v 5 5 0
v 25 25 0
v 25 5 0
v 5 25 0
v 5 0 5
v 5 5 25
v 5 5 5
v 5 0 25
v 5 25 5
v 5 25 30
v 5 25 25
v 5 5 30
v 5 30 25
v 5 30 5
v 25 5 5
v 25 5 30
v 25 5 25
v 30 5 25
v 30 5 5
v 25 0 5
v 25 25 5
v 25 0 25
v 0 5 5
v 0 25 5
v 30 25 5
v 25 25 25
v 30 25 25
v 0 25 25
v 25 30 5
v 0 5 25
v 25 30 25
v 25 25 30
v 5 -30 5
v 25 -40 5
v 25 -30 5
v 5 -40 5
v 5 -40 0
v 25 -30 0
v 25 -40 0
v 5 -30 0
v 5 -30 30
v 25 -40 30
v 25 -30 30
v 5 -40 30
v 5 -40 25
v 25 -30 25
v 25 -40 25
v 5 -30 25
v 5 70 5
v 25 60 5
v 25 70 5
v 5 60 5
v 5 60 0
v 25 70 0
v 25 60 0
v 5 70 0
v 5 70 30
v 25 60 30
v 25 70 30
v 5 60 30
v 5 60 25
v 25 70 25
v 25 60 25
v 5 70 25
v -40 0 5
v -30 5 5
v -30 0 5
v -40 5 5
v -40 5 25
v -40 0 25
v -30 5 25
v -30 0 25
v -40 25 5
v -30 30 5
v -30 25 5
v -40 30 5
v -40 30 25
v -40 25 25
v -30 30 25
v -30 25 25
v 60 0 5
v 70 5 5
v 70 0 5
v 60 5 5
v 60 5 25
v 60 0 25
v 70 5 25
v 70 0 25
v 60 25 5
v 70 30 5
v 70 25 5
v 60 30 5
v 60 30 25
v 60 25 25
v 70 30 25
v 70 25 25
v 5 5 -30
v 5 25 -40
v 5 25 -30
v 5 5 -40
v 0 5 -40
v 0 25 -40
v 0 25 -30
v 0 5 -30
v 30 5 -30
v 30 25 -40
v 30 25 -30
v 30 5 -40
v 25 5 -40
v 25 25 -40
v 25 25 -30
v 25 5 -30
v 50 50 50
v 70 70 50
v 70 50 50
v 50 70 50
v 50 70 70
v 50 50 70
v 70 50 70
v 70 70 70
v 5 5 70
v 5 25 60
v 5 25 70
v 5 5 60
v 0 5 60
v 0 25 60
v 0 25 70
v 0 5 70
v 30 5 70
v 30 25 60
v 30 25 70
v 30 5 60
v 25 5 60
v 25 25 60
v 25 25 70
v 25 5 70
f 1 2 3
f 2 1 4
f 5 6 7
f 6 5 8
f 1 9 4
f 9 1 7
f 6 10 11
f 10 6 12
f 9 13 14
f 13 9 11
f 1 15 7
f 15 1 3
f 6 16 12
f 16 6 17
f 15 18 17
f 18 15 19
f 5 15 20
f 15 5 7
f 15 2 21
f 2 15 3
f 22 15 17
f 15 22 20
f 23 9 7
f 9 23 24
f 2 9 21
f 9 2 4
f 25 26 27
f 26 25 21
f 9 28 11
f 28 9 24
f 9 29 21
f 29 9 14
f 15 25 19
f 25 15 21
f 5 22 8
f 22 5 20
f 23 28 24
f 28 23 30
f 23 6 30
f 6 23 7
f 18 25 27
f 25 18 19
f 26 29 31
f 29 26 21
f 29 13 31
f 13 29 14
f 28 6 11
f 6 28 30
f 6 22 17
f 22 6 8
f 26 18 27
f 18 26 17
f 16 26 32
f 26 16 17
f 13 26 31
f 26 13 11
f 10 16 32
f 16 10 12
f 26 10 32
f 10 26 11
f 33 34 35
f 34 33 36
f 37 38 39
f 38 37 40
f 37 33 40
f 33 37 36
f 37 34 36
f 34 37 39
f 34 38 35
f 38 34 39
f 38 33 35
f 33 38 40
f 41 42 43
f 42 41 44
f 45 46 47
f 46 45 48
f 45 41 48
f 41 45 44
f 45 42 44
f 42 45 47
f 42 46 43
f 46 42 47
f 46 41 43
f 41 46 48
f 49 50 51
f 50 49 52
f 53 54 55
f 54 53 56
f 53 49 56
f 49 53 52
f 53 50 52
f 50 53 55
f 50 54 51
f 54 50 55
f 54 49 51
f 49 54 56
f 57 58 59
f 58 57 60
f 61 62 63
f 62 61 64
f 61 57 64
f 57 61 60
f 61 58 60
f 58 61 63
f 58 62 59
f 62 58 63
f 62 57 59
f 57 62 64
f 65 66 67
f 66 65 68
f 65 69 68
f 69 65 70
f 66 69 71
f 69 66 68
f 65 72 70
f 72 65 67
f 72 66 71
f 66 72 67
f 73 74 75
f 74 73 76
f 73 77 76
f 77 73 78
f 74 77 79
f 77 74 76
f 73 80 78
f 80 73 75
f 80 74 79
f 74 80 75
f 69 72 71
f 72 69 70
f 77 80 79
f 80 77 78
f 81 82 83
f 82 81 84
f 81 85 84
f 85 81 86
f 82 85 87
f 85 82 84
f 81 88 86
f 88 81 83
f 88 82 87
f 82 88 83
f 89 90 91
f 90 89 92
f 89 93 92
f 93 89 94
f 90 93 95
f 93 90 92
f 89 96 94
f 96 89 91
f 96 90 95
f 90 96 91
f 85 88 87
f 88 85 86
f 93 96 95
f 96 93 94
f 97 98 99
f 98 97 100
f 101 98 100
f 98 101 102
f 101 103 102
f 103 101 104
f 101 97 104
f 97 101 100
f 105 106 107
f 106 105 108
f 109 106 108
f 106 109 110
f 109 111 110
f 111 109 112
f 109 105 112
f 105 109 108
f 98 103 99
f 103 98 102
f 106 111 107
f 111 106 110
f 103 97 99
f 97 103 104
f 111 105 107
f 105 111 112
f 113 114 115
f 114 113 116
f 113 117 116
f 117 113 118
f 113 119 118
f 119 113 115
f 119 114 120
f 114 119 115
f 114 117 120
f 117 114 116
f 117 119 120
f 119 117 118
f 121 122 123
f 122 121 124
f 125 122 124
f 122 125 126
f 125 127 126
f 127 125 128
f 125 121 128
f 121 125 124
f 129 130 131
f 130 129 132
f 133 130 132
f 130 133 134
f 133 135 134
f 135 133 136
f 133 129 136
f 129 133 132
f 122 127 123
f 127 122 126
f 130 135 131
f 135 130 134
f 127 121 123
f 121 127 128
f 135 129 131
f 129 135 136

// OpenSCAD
// SCAD file for Six Piece Burr Puzzle
// 整体模型
union() {
  translate([5, 5, 0]) color([0, 0.8, 0, 0.85]) cube([5, 5, 5]);
  translate([10, 5, 0]) color([0, 0.8, 0, 0.85]) cube([5, 5, 5]);
  translate([15, 5, 0]) color([0, 0.8, 0, 0.85]) cube([5, 5, 5]);
  translate([20, 5, 0]) color([0, 0.8, 0, 0.85]) cube([5, 5, 5]);
  translate([5, 10, 0]) color([0, 0.8, 0, 0.85]) cube([5, 5, 5]);
  translate([10, 10, 0]) color([0, 0.8, 0, 0.85]) cube([5, 5, 5]);
  translate([15, 10, 0]) color([0, 0.8, 0, 0.85]) cube([5, 5, 5]);
  translate([20, 10, 0]) color([0, 0.8, 0, 0.85]) cube([5, 5, 5]);
  translate([5, 15, 0]) color([1, 0, 0, 0.85]) cube([5, 5, 5]);
  translate([10, 15, 0]) color([1, 0, 0, 0.85]) cube([5, 5, 5]);
  translate([15, 15, 0]) color([1, 0, 0, 0.85]) cube([5, 5, 5]);
  translate([20, 15, 0]) color([1, 0, 0, 0.85]) cube([5, 5, 5]);
  translate([5, 20, 0]) color([1, 0, 0, 0.85]) cube([5, 5, 5]);
  translate([10, 20, 0]) color([1, 0, 0, 0.85]) cube([5, 5, 5]);
  translate([15, 20, 0]) color([1, 0, 0, 0.85]) cube([5, 5, 5]);
  translate([20, 20, 0]) color([1, 0, 0, 0.85]) cube([5, 5, 5]);
  translate([5, 0, 5]) color([0.6, 0, 1, 0.85]) cube([5, 5, 5]);
  translate([10, 0, 5]) color([0.6, 0, 1, 0.85]) cube([5, 5, 5]);
  translate([15, 0, 5]) color([1, 0.4, 0, 0.85]) cube([5, 5, 5]);
  translate([20, 0, 5]) color([1, 0.4, 0, 0.85]) cube([5, 5, 5]);
  translate([0, 5, 5]) color([1, 0.8, 0, 0.85]) cube([5, 5, 5]);
  translate([5, 5, 5]) color([0.8, 0.8, 0.8, 0.85]) cube([5, 5, 5]);
  translate([10, 5, 5]) color([0.8, 0.8, 0.8, 0.85]) cube([5, 5, 5]);
  translate([15, 5, 5]) color([0.8, 0.8, 0.8, 0.85]) cube([5, 5, 5]);
  translate([20, 5, 5]) color([0.8, 0.8, 0.8, 0.85]) cube([5, 5, 5]);
  translate([25, 5, 5]) color([1, 0.8, 0, 0.85]) cube([5, 5, 5]);
  translate([0, 10, 5]) color([1, 0.8, 0, 0.85]) cube([5, 5, 5]);
  translate([5, 10, 5]) color([0.8, 0.8, 0.8, 0.85]) cube([5, 5, 5]);
  translate([10, 10, 5]) color([0.8, 0.8, 0.8, 0.85]) cube([5, 5, 5]);
  translate([15, 10, 5]) color([0.8, 0.8, 0.8, 0.85]) cube([5, 5, 5]);
  translate([20, 10, 5]) color([0.8, 0.8, 0.8, 0.85]) cube([5, 5, 5]);
  translate([25, 10, 5]) color([1, 0.8, 0, 0.85]) cube([5, 5, 5]);
  translate([0, 15, 5]) color([1, 0.8, 0, 0.85]) cube([5, 5, 5]);
  translate([5, 15, 5]) color([0.8, 0.8, 0.8, 0.85]) cube([5, 5, 5]);
  translate([10, 15, 5]) color([0.8, 0.8, 0.8, 0.85]) cube([5, 5, 5]);
  translate([15, 15, 5]) color([0.8, 0.8, 0.8, 0.85]) cube([5, 5, 5]);
  translate([20, 15, 5]) color([0.8, 0.8, 0.8, 0.85]) cube([5, 5, 5]);
  translate([25, 15, 5]) color([1, 0.8, 0, 0.85]) cube([5, 5, 5]);
  translate([0, 20, 5]) color([1, 0.8, 0, 0.85]) cube([5, 5, 5]);
  translate([5, 20, 5]) color([0.8, 0.8, 0.8, 0.85]) cube([5, 5, 5]);
  translate([10, 20, 5]) color([0.8, 0.8, 0.8, 0.85]) cube([5, 5, 5]);
  translate([15, 20, 5]) color([0.8, 0.8, 0.8, 0.85]) cube([5, 5, 5]);
  translate([20, 20, 5]) color([0.8, 0.8, 0.8, 0.85]) cube([5, 5, 5]);
  translate([25, 20, 5]) color([1, 0.8, 0, 0.85]) cube([5, 5, 5]);
  translate([5, 25, 5]) color([0.6, 0, 1, 0.85]) cube([5, 5, 5]);
  translate([10, 25, 5]) color([0.6, 0, 1, 0.85]) cube([5, 5, 5]);
  translate([15, 25, 5]) color([1, 0.4, 0, 0.85]) cube([5, 5, 5]);
  translate([20, 25, 5]) color([1, 0.4, 0, 0.85]) cube([5, 5, 5]);
  translate([5, 0, 10]) color([0.6, 0, 1, 0.85]) cube([5, 5, 5]);
  translate([10, 0, 10]) color([0.6, 0, 1, 0.85]) cube([5, 5, 5]);
  translate([15, 0, 10]) color([1, 0.4, 0, 0.85]) cube([5, 5, 5]);
  translate([20, 0, 10]) color([1, 0.4, 0, 0.85]) cube([5, 5, 5]);
  translate([0, 5, 10]) color([1, 0.8, 0, 0.85]) cube([5, 5, 5]);
  translate([5, 5, 10]) color([0.8, 0.8, 0.8, 0.85]) cube([5, 5, 5]);
  translate([10, 5, 10]) color([0.8, 0.8, 0.8, 0.85]) cube([5, 5, 5]);
  translate([15, 5, 10]) color([0.8, 0.8, 0.8, 0.85]) cube([5, 5, 5]);
  translate([20, 5, 10]) color([0.8, 0.8, 0.8, 0.85]) cube([5, 5, 5]);
  translate([25, 5, 10]) color([1, 0.8, 0, 0.85]) cube([5, 5, 5]);
  translate([0, 10, 10]) color([1, 0.8, 0, 0.85]) cube([5, 5, 5]);
  translate([5, 10, 10]) color([0.8, 0.8, 0.8, 0.85]) cube([5, 5, 5]);
  translate([10, 10, 10]) color([0.8, 0.8, 0.8, 0.85]) cube([5, 5, 5]);
  translate([15, 10, 10]) color([0.8, 0.8, 0.8, 0.85]) cube([5, 5, 5]);
  translate([20, 10, 10]) color([0.8, 0.8, 0.8, 0.85]) cube([5, 5, 5]);
  translate([25, 10, 10]) color([1, 0.8, 0, 0.85]) cube([5, 5, 5]);
  translate([0, 15, 10]) color([1, 0.8, 0, 0.85]) cube([5, 5, 5]);
  translate([5, 15, 10]) color([0.8, 0.8, 0.8, 0.85]) cube([5, 5, 5]);
  translate([10, 15, 10]) color([0.8, 0.8, 0.8, 0.85]) cube([5, 5, 5]);
  translate([15, 15, 10]) color([0.8, 0.8, 0.8, 0.85]) cube([5, 5, 5]);
  translate([20, 15, 10]) color([0.8, 0.8, 0.8, 0.85]) cube([5, 5, 5]);
  translate([25, 15, 10]) color([1, 0.8, 0, 0.85]) cube([5, 5, 5]);
  translate([0, 20, 10]) color([1, 0.8, 0, 0.85]) cube([5, 5, 5]);
  translate([5, 20, 10]) color([0.8, 0.8, 0.8, 0.85]) cube([5, 5, 5]);
  translate([10, 20, 10]) color([0.8, 0.8, 0.8, 0.85]) cube([5, 5, 5]);
  translate([15, 20, 10]) color([0.8, 0.8, 0.8, 0.85]) cube([5, 5, 5]);
  translate([20, 20, 10]) color([0.8, 0.8, 0.8, 0.85]) cube([5, 5, 5]);
  translate([25, 20, 10]) color([1, 0.8, 0, 0.85]) cube([5, 5, 5]);
  translate([5, 25, 10]) color([0.6, 0, 1, 0.85]) cube([5, 5, 5]);
  translate([10, 25, 10]) color([0.6, 0, 1, 0.85]) cube([5, 5, 5]);
  translate([15, 25, 10]) color([1, 0.4, 0, 0.85]) cube([5, 5, 5]);
  translate([20, 25, 10]) color([1, 0.4, 0, 0.85]) cube([5, 5, 5]);
  translate([5, 0, 15]) color([0.6, 0, 1, 0.85]) cube([5, 5, 5]);
  translate([10, 0, 15]) color([0.6, 0, 1, 0.85]) cube([5, 5, 5]);
  translate([15, 0, 15]) color([1, 0.4, 0, 0.85]) cube([5, 5, 5]);
  translate([20, 0, 15]) color([1, 0.4, 0, 0.85]) cube([5, 5, 5]);
  translate([0, 5, 15]) color([0, 0.4, 1, 0.85]) cube([5, 5, 5]);
  translate([5, 5, 15]) color([0.8, 0.8, 0.8, 0.85]) cube([5, 5, 5]);
  translate([10, 5, 15]) color([0.8, 0.8, 0.8, 0.85]) cube([5, 5, 5]);
  translate([15, 5, 15]) color([0.8, 0.8, 0.8, 0.85]) cube([5, 5, 5]);
  translate([20, 5, 15]) color([0.8, 0.8, 0.8, 0.85]) cube([5, 5, 5]);
  translate([25, 5, 15]) color([0, 0.4, 1, 0.85]) cube([5, 5, 5]);
  translate([0, 10, 15]) color([0, 0.4, 1, 0.85]) cube([5, 5, 5]);
  translate([5, 10, 15]) color([0.8, 0.8, 0.8, 0.85]) cube([5, 5, 5]);
  translate([10, 10, 15]) color([0.8, 0.8, 0.8, 0.85]) cube([5, 5, 5]);
  translate([15, 10, 15]) color([0.8, 0.8, 0.8, 0.85]) cube([5, 5, 5]);
  translate([20, 10, 15]) color([0.8, 0.8, 0.8, 0.85]) cube([5, 5, 5]);
  translate([25, 10, 15]) color([0, 0.4, 1, 0.85]) cube([5, 5, 5]);
  translate([0, 15, 15]) color([0, 0.4, 1, 0.85]) cube([5, 5, 5]);
  translate([5, 15, 15]) color([0.8, 0.8, 0.8, 0.85]) cube([5, 5, 5]);
  translate([10, 15, 15]) color([0.8, 0.8, 0.8, 0.85]) cube([5, 5, 5]);
  translate([15, 15, 15]) color([0.8, 0.8, 0.8, 0.85]) cube([5, 5, 5]);
  translate([20, 15, 15]) color([0.8, 0.8, 0.8, 0.85]) cube([5, 5, 5]);
  translate([25, 15, 15]) color([0, 0.4, 1, 0.85]) cube([5, 5, 5]);
  translate([0, 20, 15]) color([0, 0.4, 1, 0.85]) cube([5, 5, 5]);
  translate([5, 20, 15]) color([0.8, 0.8, 0.8, 0.85]) cube([5, 5, 5]);
  translate([10, 20, 15]) color([0.8, 0.8, 0.8, 0.85]) cube([5, 5, 5]);
  translate([15, 20, 15]) color([0.8, 0.8, 0.8, 0.85]) cube([5, 5, 5]);
  translate([20, 20, 15]) color([0.8, 0.8, 0.8, 0.85]) cube([5, 5, 5]);
  translate([25, 20, 15]) color([0, 0.4, 1, 0.85]) cube([5, 5, 5]);
  translate([5, 25, 15]) color([0.6, 0, 1, 0.85]) cube([5, 5, 5]);
  translate([10, 25, 15]) color([0.6, 0, 1, 0.85]) cube([5, 5, 5]);
  translate([15, 25, 15]) color([1, 0.4, 0, 0.85]) cube([5, 5, 5]);
  translate([20, 25, 15]) color([1, 0.4, 0, 0.85]) cube([5, 5, 5]);
  translate([5, 0, 20]) color([0.6, 0, 1, 0.85]) cube([5, 5, 5]);
  translate([10, 0, 20]) color([0.6, 0, 1, 0.85]) cube([5, 5, 5]);
  translate([15, 0, 20]) color([1, 0.4, 0, 0.85]) cube([5, 5, 5]);
  translate([20, 0, 20]) color([1, 0.4, 0, 0.85]) cube([5, 5, 5]);
  translate([0, 5, 20]) color([0, 0.4, 1, 0.85]) cube([5, 5, 5]);
  translate([5, 5, 20]) color([0.8, 0.8, 0.8, 0.85]) cube([5, 5, 5]);
  translate([10, 5, 20]) color([0.8, 0.8, 0.8, 0.85]) cube([5, 5, 5]);
  translate([15, 5, 20]) color([0.8, 0.8, 0.8, 0.85]) cube([5, 5, 5]);
  translate([20, 5, 20]) color([0.8, 0.8, 0.8, 0.85]) cube([5, 5, 5]);
  translate([25, 5, 20]) color([0, 0.4, 1, 0.85]) cube([5, 5, 5]);
  translate([0, 10, 20]) color([0, 0.4, 1, 0.85]) cube([5, 5, 5]);
  translate([5, 10, 20]) color([0.8, 0.8, 0.8, 0.85]) cube([5, 5, 5]);
  translate([10, 10, 20]) color([0.8, 0.8, 0.8, 0.85]) cube([5, 5, 5]);
  translate([15, 10, 20]) color([0.8, 0.8, 0.8, 0.85]) cube([5, 5, 5]);
  translate([20, 10, 20]) color([0.8, 0.8, 0.8, 0.85]) cube([5, 5, 5]);
  translate([25, 10, 20]) color([0, 0.4, 1, 0.85]) cube([5, 5, 5]);
  translate([0, 15, 20]) color([0, 0.4, 1, 0.85]) cube([5, 5, 5]);
  translate([5, 15, 20]) color([0.8, 0.8, 0.8, 0.85]) cube([5, 5, 5]);
  translate([10, 15, 20]) color([0.8, 0.8, 0.8, 0.85]) cube([5, 5, 5]);
  translate([15, 15, 20]) color([0.8, 0.8, 0.8, 0.85]) cube([5, 5, 5]);
  translate([20, 15, 20]) color([0.8, 0.8, 0.8, 0.85]) cube([5, 5, 5]);
  translate([25, 15, 20]) color([0, 0.4, 1, 0.85]) cube([5, 5, 5]);
  translate([0, 20, 20]) color([0, 0.4, 1, 0.85]) cube([5, 5, 5]);
  translate([5, 20, 20]) color([0.8, 0.8, 0.8, 0.85]) cube([5, 5, 5]);
  translate([10, 20, 20]) color([0.8, 0.8, 0.8, 0.85]) cube([5, 5, 5]);
  translate([15, 20, 20]) color([0.8, 0.8, 0.8, 0.85]) cube([5, 5, 5]);
  translate([20, 20, 20]) color([0.8, 0.8, 0.8, 0.85]) cube([5, 5, 5]);
  translate([25, 20, 20]) color([0, 0.4, 1, 0.85]) cube([5, 5, 5]);
  translate([5, 25, 20]) color([0.6, 0, 1, 0.85]) cube([5, 5, 5]);
  translate([10, 25, 20]) color([0.6, 0, 1, 0.85]) cube([5, 5, 5]);
  translate([15, 25, 20]) color([1, 0.4, 0, 0.85]) cube([5, 5, 5]);
  translate([20, 25, 20]) color([1, 0.4, 0, 0.85]) cube([5, 5, 5]);
  translate([5, 5, 25]) color([0, 0.8, 0, 0.85]) cube([5, 5, 5]);
  translate([10, 5, 25]) color([0, 0.8, 0, 0.85]) cube([5, 5, 5]);
  translate([15, 5, 25]) color([0, 0.8, 0, 0.85]) cube([5, 5, 5]);
  translate([20, 5, 25]) color([0, 0.8, 0, 0.85]) cube([5, 5, 5]);
  translate([5, 10, 25]) color([0, 0.8, 0, 0.85]) cube([5, 5, 5]);
  translate([10, 10, 25]) color([0, 0.8, 0, 0.85]) cube([5, 5, 5]);
  translate([15, 10, 25]) color([0, 0.8, 0, 0.85]) cube([5, 5, 5]);
  translate([20, 10, 25]) color([0, 0.8, 0, 0.85]) cube([5, 5, 5]);
  translate([5, 15, 25]) color([1, 0, 0, 0.85]) cube([5, 5, 5]);
  translate([10, 15, 25]) color([1, 0, 0, 0.85]) cube([5, 5, 5]);
  translate([15, 15, 25]) color([1, 0, 0, 0.85]) cube([5, 5, 5]);
  translate([20, 15, 25]) color([1, 0, 0, 0.85]) cube([5, 5, 5]);
  translate([5, 20, 25]) color([1, 0, 0, 0.85]) cube([5, 5, 5]);
  translate([10, 20, 25]) color([1, 0, 0, 0.85]) cube([5, 5, 5]);
  translate([15, 20, 25]) color([1, 0, 0, 0.85]) cube([5, 5, 5]);
  translate([20, 20, 25]) color([1, 0, 0, 0.85]) cube([5, 5, 5]);
}

// 零件 B
union() {
  translate([5.0, -40.0, 0.0]) color([0, 0.8, 0, 0.85]) cube([5, 5, 5]);
  translate([10.0, -40.0, 0.0]) color([0, 0.8, 0, 0.85]) cube([5, 5, 5]);
  translate([15.0, -40.0, 0.0]) color([0, 0.8, 0, 0.85]) cube([5, 5, 5]);
  translate([20.0, -40.0, 0.0]) color([0, 0.8, 0, 0.85]) cube([5, 5, 5]);
  translate([5.0, -35.0, 0.0]) color([0, 0.8, 0, 0.85]) cube([5, 5, 5]);
  translate([10.0, -35.0, 0.0]) color([0, 0.8, 0, 0.85]) cube([5, 5, 5]);
  translate([15.0, -35.0, 0.0]) color([0, 0.8, 0, 0.85]) cube([5, 5, 5]);
  translate([20.0, -35.0, 0.0]) color([0, 0.8, 0, 0.85]) cube([5, 5, 5]);
  translate([5.0, -40.0, 25.0]) color([0, 0.8, 0, 0.85]) cube([5, 5, 5]);
  translate([10.0, -40.0, 25.0]) color([0, 0.8, 0, 0.85]) cube([5, 5, 5]);
  translate([15.0, -40.0, 25.0]) color([0, 0.8, 0, 0.85]) cube([5, 5, 5]);
  translate([20.0, -40.0, 25.0]) color([0, 0.8, 0, 0.85]) cube([5, 5, 5]);
  translate([5.0, -35.0, 25.0]) color([0, 0.8, 0, 0.85]) cube([5, 5, 5]);
  translate([10.0, -35.0, 25.0]) color([0, 0.8, 0, 0.85]) cube([5, 5, 5]);
  translate([15.0, -35.0, 25.0]) color([0, 0.8, 0, 0.85]) cube([5, 5, 5]);
  translate([20.0, -35.0, 25.0]) color([0, 0.8, 0, 0.85]) cube([5, 5, 5]);
}

// 零件 A
union() {
  translate([5.0, 60.0, 0.0]) color([1, 0, 0, 0.85]) cube([5, 5, 5]);
  translate([10.0, 60.0, 0.0]) color([1, 0, 0, 0.85]) cube([5, 5, 5]);
  translate([15.0, 60.0, 0.0]) color([1, 0, 0, 0.85]) cube([5, 5, 5]);
  translate([20.0, 60.0, 0.0]) color([1, 0, 0, 0.85]) cube([5, 5, 5]);
  translate([5.0, 65.0, 0.0]) color([1, 0, 0, 0.85]) cube([5, 5, 5]);
  translate([10.0, 65.0, 0.0]) color([1, 0, 0, 0.85]) cube([5, 5, 5]);
  translate([15.0, 65.0, 0.0]) color([1, 0, 0, 0.85]) cube([5, 5, 5]);
  translate([20.0, 65.0, 0.0]) color([1, 0, 0, 0.85]) cube([5, 5, 5]);
  translate([5.0, 60.0, 25.0]) color([1, 0, 0, 0.85]) cube([5, 5, 5]);
  translate([10.0, 60.0, 25.0]) color([1, 0, 0, 0.85]) cube([5, 5, 5]);
  translate([15.0, 60.0, 25.0]) color([1, 0, 0, 0.85]) cube([5, 5, 5]);
  translate([20.0, 60.0, 25.0]) color([1, 0, 0, 0.85]) cube([5, 5, 5]);
  translate([5.0, 65.0, 25.0]) color([1, 0, 0, 0.85]) cube([5, 5, 5]);
  translate([10.0, 65.0, 25.0]) color([1, 0, 0, 0.85]) cube([5, 5, 5]);
  translate([15.0, 65.0, 25.0]) color([1, 0, 0, 0.85]) cube([5, 5, 5]);
  translate([20.0, 65.0, 25.0]) color([1, 0, 0, 0.85]) cube([5, 5, 5]);
}

// 零件 F
union() {
  translate([-40.0, 0.0, 5.0]) color([0.6, 0, 1, 0.85]) cube([5, 5, 5]);
  translate([-35.0, 0.0, 5.0]) color([0.6, 0, 1, 0.85]) cube([5, 5, 5]);
  translate([-40.0, 25.0, 5.0]) color([0.6, 0, 1, 0.85]) cube([5, 5, 5]);
  translate([-35.0, 25.0, 5.0]) color([0.6, 0, 1, 0.85]) cube([5, 5, 5]);
  translate([-40.0, 0.0, 10.0]) color([0.6, 0, 1, 0.85]) cube([5, 5, 5]);
  translate([-35.0, 0.0, 10.0]) color([0.6, 0, 1, 0.85]) cube([5, 5, 5]);
  translate([-40.0, 25.0, 10.0]) color([0.6, 0, 1, 0.85]) cube([5, 5, 5]);
  translate([-35.0, 25.0, 10.0]) color([0.6, 0, 1, 0.85]) cube([5, 5, 5]);
  translate([-40.0, 0.0, 15.0]) color([0.6, 0, 1, 0.85]) cube([5, 5, 5]);
  translate([-35.0, 0.0, 15.0]) color([0.6, 0, 1, 0.85]) cube([5, 5, 5]);
  translate([-40.0, 25.0, 15.0]) color([0.6, 0, 1, 0.85]) cube([5, 5, 5]);
  translate([-35.0, 25.0, 15.0]) color([0.6, 0, 1, 0.85]) cube([5, 5, 5]);
  translate([-40.0, 0.0, 20.0]) color([0.6, 0, 1, 0.85]) cube([5, 5, 5]);
  translate([-35.0, 0.0, 20.0]) color([0.6, 0, 1, 0.85]) cube([5, 5, 5]);
  translate([-40.0, 25.0, 20.0]) color([0.6, 0, 1, 0.85]) cube([5, 5, 5]);
  translate([-35.0, 25.0, 20.0]) color([0.6, 0, 1, 0.85]) cube([5, 5, 5]);
}

// 零件 E
union() {
  translate([60.0, 0.0, 5.0]) color([1, 0.4, 0, 0.85]) cube([5, 5, 5]);
  translate([65.0, 0.0, 5.0]) color([1, 0.4, 0, 0.85]) cube([5, 5, 5]);
  translate([60.0, 25.0, 5.0]) color([1, 0.4, 0, 0.85]) cube([5, 5, 5]);
  translate([65.0, 25.0, 5.0]) color([1, 0.4, 0, 0.85]) cube([5, 5, 5]);
  translate([60.0, 0.0, 10.0]) color([1, 0.4, 0, 0.85]) cube([5, 5, 5]);
  translate([65.0, 0.0, 10.0]) color([1, 0.4, 0, 0.85]) cube([5, 5, 5]);
  translate([60.0, 25.0, 10.0]) color([1, 0.4, 0, 0.85]) cube([5, 5, 5]);
  translate([65.0, 25.0, 10.0]) color([1, 0.4, 0, 0.85]) cube([5, 5, 5]);
  translate([60.0, 0.0, 15.0]) color([1, 0.4, 0, 0.85]) cube([5, 5, 5]);
  translate([65.0, 0.0, 15.0]) color([1, 0.4, 0, 0.85]) cube([5, 5, 5]);
  translate([60.0, 25.0, 15.0]) color([1, 0.4, 0, 0.85]) cube([5, 5, 5]);
  translate([65.0, 25.0, 15.0]) color([1, 0.4, 0, 0.85]) cube([5, 5, 5]);
  translate([60.0, 0.0, 20.0]) color([1, 0.4, 0, 0.85]) cube([5, 5, 5]);
  translate([65.0, 0.0, 20.0]) color([1, 0.4, 0, 0.85]) cube([5, 5, 5]);
  translate([60.0, 25.0, 20.0]) color([1, 0.4, 0, 0.85]) cube([5, 5, 5]);
  translate([65.0, 25.0, 20.0]) color([1, 0.4, 0, 0.85]) cube([5, 5, 5]);
}

// 零件 D
union() {
  translate([0.0, 5.0, -40.0]) color([1, 0.8, 0, 0.85]) cube([5, 5, 5]);
  translate([25.0, 5.0, -40.0]) color([1, 0.8, 0, 0.85]) cube([5, 5, 5]);
  translate([0.0, 10.0, -40.0]) color([1, 0.8, 0, 0.85]) cube([5, 5, 5]);
  translate([25.0, 10.0, -40.0]) color([1, 0.8, 0, 0.85]) cube([5, 5, 5]);
  translate([0.0, 15.0, -40.0]) color([1, 0.8, 0, 0.85]) cube([5, 5, 5]);
  translate([25.0, 15.0, -40.0]) color([1, 0.8, 0, 0.85]) cube([5, 5, 5]);
  translate([0.0, 20.0, -40.0]) color([1, 0.8, 0, 0.85]) cube([5, 5, 5]);
  translate([25.0, 20.0, -40.0]) color([1, 0.8, 0, 0.85]) cube([5, 5, 5]);
  translate([0.0, 5.0, -35.0]) color([1, 0.8, 0, 0.85]) cube([5, 5, 5]);
  translate([25.0, 5.0, -35.0]) color([1, 0.8, 0, 0.85]) cube([5, 5, 5]);
  translate([0.0, 10.0, -35.0]) color([1, 0.8, 0, 0.85]) cube([5, 5, 5]);
  translate([25.0, 10.0, -35.0]) color([1, 0.8, 0, 0.85]) cube([5, 5, 5]);
  translate([0.0, 15.0, -35.0]) color([1, 0.8, 0, 0.85]) cube([5, 5, 5]);
  translate([25.0, 15.0, -35.0]) color([1, 0.8, 0, 0.85]) cube([5, 5, 5]);
  translate([0.0, 20.0, -35.0]) color([1, 0.8, 0, 0.85]) cube([5, 5, 5]);
  translate([25.0, 20.0, -35.0]) color([1, 0.8, 0, 0.85]) cube([5, 5, 5]);
}

// 零件 public
union() {
  translate([50.0, 50.0, 50.0]) color([0.8, 0.8, 0.8, 0.85]) cube([5, 5, 5]);
  translate([55.0, 50.0, 50.0]) color([0.8, 0.8, 0.8, 0.85]) cube([5, 5, 5]);
  translate([60.0, 50.0, 50.0]) color([0.8, 0.8, 0.8, 0.85]) cube([5, 5, 5]);
  translate([65.0, 50.0, 50.0]) color([0.8, 0.8, 0.8, 0.85]) cube([5, 5, 5]);
  translate([50.0, 55.0, 50.0]) color([0.8, 0.8, 0.8, 0.85]) cube([5, 5, 5]);
  translate([55.0, 55.0, 50.0]) color([0.8, 0.8, 0.8, 0.85]) cube([5, 5, 5]);
  translate([60.0, 55.0, 50.0]) color([0.8, 0.8, 0.8, 0.85]) cube([5, 5, 5]);
  translate([65.0, 55.0, 50.0]) color([0.8, 0.8, 0.8, 0.85]) cube([5, 5, 5]);
  translate([50.0, 60.0, 50.0]) color([0.8, 0.8, 0.8, 0.85]) cube([5, 5, 5]);
  translate([55.0, 60.0, 50.0]) color([0.8, 0.8, 0.8, 0.85]) cube([5, 5, 5]);
  translate([60.0, 60.0, 50.0]) color([0.8, 0.8, 0.8, 0.85]) cube([5, 5, 5]);
  translate([65.0, 60.0, 50.0]) color([0.8, 0.8, 0.8, 0.85]) cube([5, 5, 5]);
  translate([50.0, 65.0, 50.0]) color([0.8, 0.8, 0.8, 0.85]) cube([5, 5, 5]);
  translate([55.0, 65.0, 50.0]) color([0.8, 0.8, 0.8, 0.85]) cube([5, 5, 5]);
  translate([60.0, 65.0, 50.0]) color([0.8, 0.8, 0.8, 0.85]) cube([5, 5, 5]);
  translate([65.0, 65.0, 50.0]) color([0.8, 0.8, 0.8, 0.85]) cube([5, 5, 5]);
  translate([50.0, 50.0, 55.0]) color([0.8, 0.8, 0.8, 0.85]) cube([5, 5, 5]);
  translate([55.0, 50.0, 55.0]) color([0.8, 0.8, 0.8, 0.85]) cube([5, 5, 5]);
  translate([60.0, 50.0, 55.0]) color([0.8, 0.8, 0.8, 0.85]) cube([5, 5, 5]);
  translate([65.0, 50.0, 55.0]) color([0.8, 0.8, 0.8, 0.85]) cube([5, 5, 5]);
  translate([50.0, 55.0, 55.0]) color([0.8, 0.8, 0.8, 0.85]) cube([5, 5, 5]);
  translate([55.0, 55.0, 55.0]) color([0.8, 0.8, 0.8, 0.85]) cube([5, 5, 5]);
  translate([60.0, 55.0, 55.0]) color([0.8, 0.8, 0.8, 0.85]) cube([5, 5, 5]);
  translate([65.0, 55.0, 55.0]) color([0.8, 0.8, 0.8, 0.85]) cube([5, 5, 5]);
  translate([50.0, 60.0, 55.0]) color([0.8, 0.8, 0.8, 0.85]) cube([5, 5, 5]);
  translate([55.0, 60.0, 55.0]) color([0.8, 0.8, 0.8, 0.85]) cube([5, 5, 5]);
  translate([60.0, 60.0, 55.0]) color([0.8, 0.8, 0.8, 0.85]) cube([5, 5, 5]);
  translate([65.0, 60.0, 55.0]) color([0.8, 0.8, 0.8, 0.85]) cube([5, 5, 5]);
  translate([50.0, 65.0, 55.0]) color([0.8, 0.8, 0.8, 0.85]) cube([5, 5, 5]);
  translate([55.0, 65.0, 55.0]) color([0.8, 0.8, 0.8, 0.85]) cube([5, 5, 5]);
  translate([60.0, 65.0, 55.0]) color([0.8, 0.8, 0.8, 0.85]) cube([5, 5, 5]);
  translate([65.0, 65.0, 55.0]) color([0.8, 0.8, 0.8, 0.85]) cube([5, 5, 5]);
  translate([50.0, 50.0, 60.0]) color([0.8, 0.8, 0.8, 0.85]) cube([5, 5, 5]);
  translate([55.0, 50.0, 60.0]) color([0.8, 0.8, 0.8, 0.85]) cube([5, 5, 5]);
  translate([60.0, 50.0, 60.0]) color([0.8, 0.8, 0.8, 0.85]) cube([5, 5, 5]);
  translate([65.0, 50.0, 60.0]) color([0.8, 0.8, 0.8, 0.85]) cube([5, 5, 5]);
  translate([50.0, 55.0, 60.0]) color([0.8, 0.8, 0.8, 0.85]) cube([5, 5, 5]);
  translate([55.0, 55.0, 60.0]) color([0.8, 0.8, 0.8, 0.85]) cube([5, 5, 5]);
  translate([60.0, 55.0, 60.0]) color([0.8, 0.8, 0.8, 0.85]) cube([5, 5, 5]);
  translate([65.0, 55.0, 60.0]) color([0.8, 0.8, 0.8, 0.85]) cube([5, 5, 5]);
  translate([50.0, 60.0, 60.0]) color([0.8, 0.8, 0.8, 0.85]) cube([5, 5, 5]);
  translate([55.0, 60.0, 60.0]) color([0.8, 0.8, 0.8, 0.85]) cube([5, 5, 5]);
  translate([60.0, 60.0, 60.0]) color([0.8, 0.8, 0.8, 0.85]) cube([5, 5, 5]);
  translate([65.0, 60.0, 60.0]) color([0.8, 0.8, 0.8, 0.85]) cube([5, 5, 5]);
  translate([50.0, 65.0, 60.0]) color([0.8, 0.8, 0.8, 0.85]) cube([5, 5, 5]);
  translate([55.0, 65.0, 60.0]) color([0.8, 0.8, 0.8, 0.85]) cube([5, 5, 5]);
  translate([60.0, 65.0, 60.0]) color([0.8, 0.8, 0.8, 0.85]) cube([5, 5, 5]);
  translate([65.0, 65.0, 60.0]) color([0.8, 0.8, 0.8, 0.85]) cube([5, 5, 5]);
  translate([50.0, 50.0, 65.0]) color([0.8, 0.8, 0.8, 0.85]) cube([5, 5, 5]);
  translate([55.0, 50.0, 65.0]) color([0.8, 0.8, 0.8, 0.85]) cube([5, 5, 5]);
  translate([60.0, 50.0, 65.0]) color([0.8, 0.8, 0.8, 0.85]) cube([5, 5, 5]);
  translate([65.0, 50.0, 65.0]) color([0.8, 0.8, 0.8, 0.85]) cube([5, 5, 5]);
  translate([50.0, 55.0, 65.0]) color([0.8, 0.8, 0.8, 0.85]) cube([5, 5, 5]);
  translate([55.0, 55.0, 65.0]) color([0.8, 0.8, 0.8, 0.85]) cube([5, 5, 5]);
  translate([60.0, 55.0, 65.0]) color([0.8, 0.8, 0.8, 0.85]) cube([5, 5, 5]);
  translate([65.0, 55.0, 65.0]) color([0.8, 0.8, 0.8, 0.85]) cube([5, 5, 5]);
  translate([50.0, 60.0, 65.0]) color([0.8, 0.8, 0.8, 0.85]) cube([5, 5, 5]);
  translate([55.0, 60.0, 65.0]) color([0.8, 0.8, 0.8, 0.85]) cube([5, 5, 5]);
  translate([60.0, 60.0, 65.0]) color([0.8, 0.8, 0.8, 0.85]) cube([5, 5, 5]);
  translate([65.0, 60.0, 65.0]) color([0.8, 0.8, 0.8, 0.85]) cube([5, 5, 5]);
  translate([50.0, 65.0, 65.0]) color([0.8, 0.8, 0.8, 0.85]) cube([5, 5, 5]);
  translate([55.0, 65.0, 65.0]) color([0.8, 0.8, 0.8, 0.85]) cube([5, 5, 5]);
  translate([60.0, 65.0, 65.0]) color([0.8, 0.8, 0.8, 0.85]) cube([5, 5, 5]);
  translate([65.0, 65.0, 65.0]) color([0.8, 0.8, 0.8, 0.85]) cube([5, 5, 5]);
}

// 零件 C
union() {
  translate([0.0, 5.0, 60.0]) color([0, 0.4, 1, 0.85]) cube([5, 5, 5]);
  translate([25.0, 5.0, 60.0]) color([0, 0.4, 1, 0.85]) cube([5, 5, 5]);
  translate([0.0, 10.0, 60.0]) color([0, 0.4, 1, 0.85]) cube([5, 5, 5]);
  translate([25.0, 10.0, 60.0]) color([0, 0.4, 1, 0.85]) cube([5, 5, 5]);
  translate([0.0, 15.0, 60.0]) color([0, 0.4, 1, 0.85]) cube([5, 5, 5]);
  translate([25.0, 15.0, 60.0]) color([0, 0.4, 1, 0.85]) cube([5, 5, 5]);
  translate([0.0, 20.0, 60.0]) color([0, 0.4, 1, 0.85]) cube([5, 5, 5]);
  translate([25.0, 20.0, 60.0]) color([0, 0.4, 1, 0.85]) cube([5, 5, 5]);
  translate([0.0, 5.0, 65.0]) color([0, 0.4, 1, 0.85]) cube([5, 5, 5]);
  translate([25.0, 5.0, 65.0]) color([0, 0.4, 1, 0.85]) cube([5, 5, 5]);
  translate([0.0, 10.0, 65.0]) color([0, 0.4, 1, 0.85]) cube([5, 5, 5]);
  translate([25.0, 10.0, 65.0]) color([0, 0.4, 1, 0.85]) cube([5, 5, 5]);
  translate([0.0, 15.0, 65.0]) color([0, 0.4, 1, 0.85]) cube([5, 5, 5]);
  translate([25.0, 15.0, 65.0]) color([0, 0.4, 1, 0.85]) cube([5, 5, 5]);
  translate([0.0, 20.0, 65.0]) color([0, 0.4, 1, 0.85]) cube([5, 5, 5]);
  translate([25.0, 20.0, 65.0]) color([0, 0.4, 1, 0.85]) cube([5, 5, 5]);
}
